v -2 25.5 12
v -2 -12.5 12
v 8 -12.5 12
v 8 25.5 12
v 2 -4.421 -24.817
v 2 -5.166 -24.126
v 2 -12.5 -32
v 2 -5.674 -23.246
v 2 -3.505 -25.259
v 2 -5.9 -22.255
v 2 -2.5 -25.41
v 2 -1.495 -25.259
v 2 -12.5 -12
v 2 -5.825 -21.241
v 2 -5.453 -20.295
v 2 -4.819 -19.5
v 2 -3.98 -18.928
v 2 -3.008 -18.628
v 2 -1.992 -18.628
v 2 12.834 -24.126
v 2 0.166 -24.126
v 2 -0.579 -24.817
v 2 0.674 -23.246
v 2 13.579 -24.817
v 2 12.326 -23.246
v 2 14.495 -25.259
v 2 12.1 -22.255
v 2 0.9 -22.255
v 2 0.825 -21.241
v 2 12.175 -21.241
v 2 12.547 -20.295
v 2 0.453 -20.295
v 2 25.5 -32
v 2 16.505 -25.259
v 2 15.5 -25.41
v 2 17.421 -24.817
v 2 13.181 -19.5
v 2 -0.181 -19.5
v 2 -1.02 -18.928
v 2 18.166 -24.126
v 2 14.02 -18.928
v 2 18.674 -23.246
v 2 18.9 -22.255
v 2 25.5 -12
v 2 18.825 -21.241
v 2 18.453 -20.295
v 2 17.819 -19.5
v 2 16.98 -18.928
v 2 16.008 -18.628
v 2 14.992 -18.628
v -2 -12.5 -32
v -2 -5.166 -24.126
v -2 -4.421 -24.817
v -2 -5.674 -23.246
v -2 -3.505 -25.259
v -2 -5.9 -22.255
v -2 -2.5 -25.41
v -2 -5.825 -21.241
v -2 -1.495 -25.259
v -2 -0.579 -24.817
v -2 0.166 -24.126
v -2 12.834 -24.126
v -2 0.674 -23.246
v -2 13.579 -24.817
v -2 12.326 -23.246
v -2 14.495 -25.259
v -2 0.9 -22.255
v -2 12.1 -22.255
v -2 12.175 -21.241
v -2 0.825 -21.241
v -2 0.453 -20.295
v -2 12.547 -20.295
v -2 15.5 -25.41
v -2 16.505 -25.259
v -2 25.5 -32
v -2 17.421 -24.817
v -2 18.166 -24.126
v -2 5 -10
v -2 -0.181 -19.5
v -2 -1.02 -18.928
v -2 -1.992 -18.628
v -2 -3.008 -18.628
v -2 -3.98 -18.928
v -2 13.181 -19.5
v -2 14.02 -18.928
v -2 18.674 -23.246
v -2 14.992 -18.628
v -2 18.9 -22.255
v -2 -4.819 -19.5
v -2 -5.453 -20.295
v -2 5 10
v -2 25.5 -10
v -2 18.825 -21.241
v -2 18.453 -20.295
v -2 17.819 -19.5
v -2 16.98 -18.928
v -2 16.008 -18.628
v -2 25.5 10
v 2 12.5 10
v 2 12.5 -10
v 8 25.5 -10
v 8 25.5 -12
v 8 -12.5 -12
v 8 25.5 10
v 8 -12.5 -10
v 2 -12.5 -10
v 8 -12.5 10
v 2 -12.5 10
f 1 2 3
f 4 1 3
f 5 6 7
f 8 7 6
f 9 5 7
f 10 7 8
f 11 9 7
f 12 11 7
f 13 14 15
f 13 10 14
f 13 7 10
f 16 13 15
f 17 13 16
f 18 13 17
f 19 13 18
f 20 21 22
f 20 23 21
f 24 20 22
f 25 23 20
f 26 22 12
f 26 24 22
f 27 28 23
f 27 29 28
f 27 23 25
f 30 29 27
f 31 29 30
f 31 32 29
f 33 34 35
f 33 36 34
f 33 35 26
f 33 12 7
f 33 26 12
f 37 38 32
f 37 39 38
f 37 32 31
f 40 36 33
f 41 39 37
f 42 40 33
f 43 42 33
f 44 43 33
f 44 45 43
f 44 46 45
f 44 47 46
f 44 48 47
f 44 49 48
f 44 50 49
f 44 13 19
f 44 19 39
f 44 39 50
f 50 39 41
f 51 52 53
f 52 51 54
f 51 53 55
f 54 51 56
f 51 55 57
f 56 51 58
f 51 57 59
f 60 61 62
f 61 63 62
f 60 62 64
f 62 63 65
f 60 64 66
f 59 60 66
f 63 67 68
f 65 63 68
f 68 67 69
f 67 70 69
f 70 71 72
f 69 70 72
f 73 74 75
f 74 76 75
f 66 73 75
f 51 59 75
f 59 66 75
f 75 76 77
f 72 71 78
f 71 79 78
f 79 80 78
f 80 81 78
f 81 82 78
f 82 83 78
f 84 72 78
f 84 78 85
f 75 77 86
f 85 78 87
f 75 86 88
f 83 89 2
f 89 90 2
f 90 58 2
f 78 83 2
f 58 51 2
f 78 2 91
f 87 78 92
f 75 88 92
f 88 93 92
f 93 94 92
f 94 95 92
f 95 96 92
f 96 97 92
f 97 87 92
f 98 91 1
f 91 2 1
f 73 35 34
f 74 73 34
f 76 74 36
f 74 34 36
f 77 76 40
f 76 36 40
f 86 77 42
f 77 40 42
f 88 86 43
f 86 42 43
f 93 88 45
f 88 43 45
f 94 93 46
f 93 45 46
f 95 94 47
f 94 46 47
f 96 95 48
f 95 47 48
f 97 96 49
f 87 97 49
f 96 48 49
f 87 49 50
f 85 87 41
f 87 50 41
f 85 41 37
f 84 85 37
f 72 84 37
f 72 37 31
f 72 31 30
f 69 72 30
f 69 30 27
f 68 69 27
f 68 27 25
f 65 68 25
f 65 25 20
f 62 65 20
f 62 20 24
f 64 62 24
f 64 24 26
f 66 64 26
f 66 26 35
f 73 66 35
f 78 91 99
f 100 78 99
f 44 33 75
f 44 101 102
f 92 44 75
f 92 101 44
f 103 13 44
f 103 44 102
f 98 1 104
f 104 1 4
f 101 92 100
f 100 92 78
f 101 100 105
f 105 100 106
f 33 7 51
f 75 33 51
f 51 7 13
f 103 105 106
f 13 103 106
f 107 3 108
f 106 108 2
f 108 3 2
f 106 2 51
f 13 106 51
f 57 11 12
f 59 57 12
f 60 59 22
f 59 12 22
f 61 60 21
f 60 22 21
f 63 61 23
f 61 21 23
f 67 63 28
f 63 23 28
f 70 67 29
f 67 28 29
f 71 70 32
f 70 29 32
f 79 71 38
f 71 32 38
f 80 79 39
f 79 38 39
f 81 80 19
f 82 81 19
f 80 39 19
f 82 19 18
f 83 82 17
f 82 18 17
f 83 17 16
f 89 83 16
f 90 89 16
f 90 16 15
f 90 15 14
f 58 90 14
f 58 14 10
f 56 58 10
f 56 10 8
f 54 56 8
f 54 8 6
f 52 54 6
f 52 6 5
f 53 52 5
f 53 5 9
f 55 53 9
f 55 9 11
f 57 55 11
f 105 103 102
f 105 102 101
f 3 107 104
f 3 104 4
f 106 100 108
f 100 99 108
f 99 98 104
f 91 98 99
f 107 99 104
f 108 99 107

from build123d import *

# Parameters (mm, degrees)
BOSS_EXTRUDE1_DEPTH = 10
SKETCH2_W           = 10
SKETCH2_H           = 2
BOSS_EXTRUDE2_DEPTH = 38
SKETCH4_W           = 4
SKETCH4_H           = 38
BOSS_EXTRUDE3_DEPTH = 20
CUT_EXTRUDE1_REACH  = 43.355
SKETCH3_R           = 3.41


with BuildPart() as part:
    # Sketch1 → Boss-Extrude1 (new, symmetric)
    with BuildSketch(Plane.XY):
        Polygon((-2, 5), (2, 12.5), (2, -12.5), (-2, -12.5), align=None)
    extrude(amount=BOSS_EXTRUDE1_DEPTH, both=True)

    # Sketch2 → Boss-Extrude2 (add)
    with BuildSketch(Plane.XZ.offset(12.5)):
        with Locations((3, 11)):
            Rectangle(SKETCH2_W, SKETCH2_H)
        with Locations((3, -11)):
            Rectangle(SKETCH2_W, SKETCH2_H)
    extrude(amount=-BOSS_EXTRUDE2_DEPTH)

    # Sketch4 → Boss-Extrude3 (add)
    with BuildSketch(Plane(origin=(0, 0, -12), x_dir=(-1, 0, 0), z_dir=(0, 0, -1))):
        with Locations((0, 6.5)):
            Rectangle(SKETCH4_W, SKETCH4_H)
    extrude(amount=BOSS_EXTRUDE3_DEPTH)

    # Sketch3 → Cut-Extrude1 (cut, up to next)
    with BuildSketch(Plane(origin=(2, 0, 0), x_dir=(0, 0, -1), z_dir=(1, 0, 0)), mode=Mode.PRIVATE) as cut_extrude1_sk1:
        with Locations((22, -2.5)):
            Circle(SKETCH3_R)
    cut_extrude1_tool1 = extrude(cut_extrude1_sk1.sketch, amount=-CUT_EXTRUDE1_REACH, mode=Mode.PRIVATE) & part.part
    # Sketch3 → Cut-Extrude1 (cut, up to next)
    with BuildSketch(Plane(origin=(2, 0, 0), x_dir=(0, 0, -1), z_dir=(1, 0, 0)), mode=Mode.PRIVATE) as cut_extrude1_sk2:
        with Locations((22, 15.5)):
            Circle(SKETCH3_R)
    cut_extrude1_tool2 = extrude(cut_extrude1_sk2.sketch, amount=-CUT_EXTRUDE1_REACH, mode=Mode.PRIVATE) & part.part
    add(cut_extrude1_tool1.solids().sort_by_distance((2, -2.5, -22))[0], mode=Mode.SUBTRACT)
    add(cut_extrude1_tool2.solids().sort_by_distance((2, 15.5, -22))[0], mode=Mode.SUBTRACT)


solid = part.part
